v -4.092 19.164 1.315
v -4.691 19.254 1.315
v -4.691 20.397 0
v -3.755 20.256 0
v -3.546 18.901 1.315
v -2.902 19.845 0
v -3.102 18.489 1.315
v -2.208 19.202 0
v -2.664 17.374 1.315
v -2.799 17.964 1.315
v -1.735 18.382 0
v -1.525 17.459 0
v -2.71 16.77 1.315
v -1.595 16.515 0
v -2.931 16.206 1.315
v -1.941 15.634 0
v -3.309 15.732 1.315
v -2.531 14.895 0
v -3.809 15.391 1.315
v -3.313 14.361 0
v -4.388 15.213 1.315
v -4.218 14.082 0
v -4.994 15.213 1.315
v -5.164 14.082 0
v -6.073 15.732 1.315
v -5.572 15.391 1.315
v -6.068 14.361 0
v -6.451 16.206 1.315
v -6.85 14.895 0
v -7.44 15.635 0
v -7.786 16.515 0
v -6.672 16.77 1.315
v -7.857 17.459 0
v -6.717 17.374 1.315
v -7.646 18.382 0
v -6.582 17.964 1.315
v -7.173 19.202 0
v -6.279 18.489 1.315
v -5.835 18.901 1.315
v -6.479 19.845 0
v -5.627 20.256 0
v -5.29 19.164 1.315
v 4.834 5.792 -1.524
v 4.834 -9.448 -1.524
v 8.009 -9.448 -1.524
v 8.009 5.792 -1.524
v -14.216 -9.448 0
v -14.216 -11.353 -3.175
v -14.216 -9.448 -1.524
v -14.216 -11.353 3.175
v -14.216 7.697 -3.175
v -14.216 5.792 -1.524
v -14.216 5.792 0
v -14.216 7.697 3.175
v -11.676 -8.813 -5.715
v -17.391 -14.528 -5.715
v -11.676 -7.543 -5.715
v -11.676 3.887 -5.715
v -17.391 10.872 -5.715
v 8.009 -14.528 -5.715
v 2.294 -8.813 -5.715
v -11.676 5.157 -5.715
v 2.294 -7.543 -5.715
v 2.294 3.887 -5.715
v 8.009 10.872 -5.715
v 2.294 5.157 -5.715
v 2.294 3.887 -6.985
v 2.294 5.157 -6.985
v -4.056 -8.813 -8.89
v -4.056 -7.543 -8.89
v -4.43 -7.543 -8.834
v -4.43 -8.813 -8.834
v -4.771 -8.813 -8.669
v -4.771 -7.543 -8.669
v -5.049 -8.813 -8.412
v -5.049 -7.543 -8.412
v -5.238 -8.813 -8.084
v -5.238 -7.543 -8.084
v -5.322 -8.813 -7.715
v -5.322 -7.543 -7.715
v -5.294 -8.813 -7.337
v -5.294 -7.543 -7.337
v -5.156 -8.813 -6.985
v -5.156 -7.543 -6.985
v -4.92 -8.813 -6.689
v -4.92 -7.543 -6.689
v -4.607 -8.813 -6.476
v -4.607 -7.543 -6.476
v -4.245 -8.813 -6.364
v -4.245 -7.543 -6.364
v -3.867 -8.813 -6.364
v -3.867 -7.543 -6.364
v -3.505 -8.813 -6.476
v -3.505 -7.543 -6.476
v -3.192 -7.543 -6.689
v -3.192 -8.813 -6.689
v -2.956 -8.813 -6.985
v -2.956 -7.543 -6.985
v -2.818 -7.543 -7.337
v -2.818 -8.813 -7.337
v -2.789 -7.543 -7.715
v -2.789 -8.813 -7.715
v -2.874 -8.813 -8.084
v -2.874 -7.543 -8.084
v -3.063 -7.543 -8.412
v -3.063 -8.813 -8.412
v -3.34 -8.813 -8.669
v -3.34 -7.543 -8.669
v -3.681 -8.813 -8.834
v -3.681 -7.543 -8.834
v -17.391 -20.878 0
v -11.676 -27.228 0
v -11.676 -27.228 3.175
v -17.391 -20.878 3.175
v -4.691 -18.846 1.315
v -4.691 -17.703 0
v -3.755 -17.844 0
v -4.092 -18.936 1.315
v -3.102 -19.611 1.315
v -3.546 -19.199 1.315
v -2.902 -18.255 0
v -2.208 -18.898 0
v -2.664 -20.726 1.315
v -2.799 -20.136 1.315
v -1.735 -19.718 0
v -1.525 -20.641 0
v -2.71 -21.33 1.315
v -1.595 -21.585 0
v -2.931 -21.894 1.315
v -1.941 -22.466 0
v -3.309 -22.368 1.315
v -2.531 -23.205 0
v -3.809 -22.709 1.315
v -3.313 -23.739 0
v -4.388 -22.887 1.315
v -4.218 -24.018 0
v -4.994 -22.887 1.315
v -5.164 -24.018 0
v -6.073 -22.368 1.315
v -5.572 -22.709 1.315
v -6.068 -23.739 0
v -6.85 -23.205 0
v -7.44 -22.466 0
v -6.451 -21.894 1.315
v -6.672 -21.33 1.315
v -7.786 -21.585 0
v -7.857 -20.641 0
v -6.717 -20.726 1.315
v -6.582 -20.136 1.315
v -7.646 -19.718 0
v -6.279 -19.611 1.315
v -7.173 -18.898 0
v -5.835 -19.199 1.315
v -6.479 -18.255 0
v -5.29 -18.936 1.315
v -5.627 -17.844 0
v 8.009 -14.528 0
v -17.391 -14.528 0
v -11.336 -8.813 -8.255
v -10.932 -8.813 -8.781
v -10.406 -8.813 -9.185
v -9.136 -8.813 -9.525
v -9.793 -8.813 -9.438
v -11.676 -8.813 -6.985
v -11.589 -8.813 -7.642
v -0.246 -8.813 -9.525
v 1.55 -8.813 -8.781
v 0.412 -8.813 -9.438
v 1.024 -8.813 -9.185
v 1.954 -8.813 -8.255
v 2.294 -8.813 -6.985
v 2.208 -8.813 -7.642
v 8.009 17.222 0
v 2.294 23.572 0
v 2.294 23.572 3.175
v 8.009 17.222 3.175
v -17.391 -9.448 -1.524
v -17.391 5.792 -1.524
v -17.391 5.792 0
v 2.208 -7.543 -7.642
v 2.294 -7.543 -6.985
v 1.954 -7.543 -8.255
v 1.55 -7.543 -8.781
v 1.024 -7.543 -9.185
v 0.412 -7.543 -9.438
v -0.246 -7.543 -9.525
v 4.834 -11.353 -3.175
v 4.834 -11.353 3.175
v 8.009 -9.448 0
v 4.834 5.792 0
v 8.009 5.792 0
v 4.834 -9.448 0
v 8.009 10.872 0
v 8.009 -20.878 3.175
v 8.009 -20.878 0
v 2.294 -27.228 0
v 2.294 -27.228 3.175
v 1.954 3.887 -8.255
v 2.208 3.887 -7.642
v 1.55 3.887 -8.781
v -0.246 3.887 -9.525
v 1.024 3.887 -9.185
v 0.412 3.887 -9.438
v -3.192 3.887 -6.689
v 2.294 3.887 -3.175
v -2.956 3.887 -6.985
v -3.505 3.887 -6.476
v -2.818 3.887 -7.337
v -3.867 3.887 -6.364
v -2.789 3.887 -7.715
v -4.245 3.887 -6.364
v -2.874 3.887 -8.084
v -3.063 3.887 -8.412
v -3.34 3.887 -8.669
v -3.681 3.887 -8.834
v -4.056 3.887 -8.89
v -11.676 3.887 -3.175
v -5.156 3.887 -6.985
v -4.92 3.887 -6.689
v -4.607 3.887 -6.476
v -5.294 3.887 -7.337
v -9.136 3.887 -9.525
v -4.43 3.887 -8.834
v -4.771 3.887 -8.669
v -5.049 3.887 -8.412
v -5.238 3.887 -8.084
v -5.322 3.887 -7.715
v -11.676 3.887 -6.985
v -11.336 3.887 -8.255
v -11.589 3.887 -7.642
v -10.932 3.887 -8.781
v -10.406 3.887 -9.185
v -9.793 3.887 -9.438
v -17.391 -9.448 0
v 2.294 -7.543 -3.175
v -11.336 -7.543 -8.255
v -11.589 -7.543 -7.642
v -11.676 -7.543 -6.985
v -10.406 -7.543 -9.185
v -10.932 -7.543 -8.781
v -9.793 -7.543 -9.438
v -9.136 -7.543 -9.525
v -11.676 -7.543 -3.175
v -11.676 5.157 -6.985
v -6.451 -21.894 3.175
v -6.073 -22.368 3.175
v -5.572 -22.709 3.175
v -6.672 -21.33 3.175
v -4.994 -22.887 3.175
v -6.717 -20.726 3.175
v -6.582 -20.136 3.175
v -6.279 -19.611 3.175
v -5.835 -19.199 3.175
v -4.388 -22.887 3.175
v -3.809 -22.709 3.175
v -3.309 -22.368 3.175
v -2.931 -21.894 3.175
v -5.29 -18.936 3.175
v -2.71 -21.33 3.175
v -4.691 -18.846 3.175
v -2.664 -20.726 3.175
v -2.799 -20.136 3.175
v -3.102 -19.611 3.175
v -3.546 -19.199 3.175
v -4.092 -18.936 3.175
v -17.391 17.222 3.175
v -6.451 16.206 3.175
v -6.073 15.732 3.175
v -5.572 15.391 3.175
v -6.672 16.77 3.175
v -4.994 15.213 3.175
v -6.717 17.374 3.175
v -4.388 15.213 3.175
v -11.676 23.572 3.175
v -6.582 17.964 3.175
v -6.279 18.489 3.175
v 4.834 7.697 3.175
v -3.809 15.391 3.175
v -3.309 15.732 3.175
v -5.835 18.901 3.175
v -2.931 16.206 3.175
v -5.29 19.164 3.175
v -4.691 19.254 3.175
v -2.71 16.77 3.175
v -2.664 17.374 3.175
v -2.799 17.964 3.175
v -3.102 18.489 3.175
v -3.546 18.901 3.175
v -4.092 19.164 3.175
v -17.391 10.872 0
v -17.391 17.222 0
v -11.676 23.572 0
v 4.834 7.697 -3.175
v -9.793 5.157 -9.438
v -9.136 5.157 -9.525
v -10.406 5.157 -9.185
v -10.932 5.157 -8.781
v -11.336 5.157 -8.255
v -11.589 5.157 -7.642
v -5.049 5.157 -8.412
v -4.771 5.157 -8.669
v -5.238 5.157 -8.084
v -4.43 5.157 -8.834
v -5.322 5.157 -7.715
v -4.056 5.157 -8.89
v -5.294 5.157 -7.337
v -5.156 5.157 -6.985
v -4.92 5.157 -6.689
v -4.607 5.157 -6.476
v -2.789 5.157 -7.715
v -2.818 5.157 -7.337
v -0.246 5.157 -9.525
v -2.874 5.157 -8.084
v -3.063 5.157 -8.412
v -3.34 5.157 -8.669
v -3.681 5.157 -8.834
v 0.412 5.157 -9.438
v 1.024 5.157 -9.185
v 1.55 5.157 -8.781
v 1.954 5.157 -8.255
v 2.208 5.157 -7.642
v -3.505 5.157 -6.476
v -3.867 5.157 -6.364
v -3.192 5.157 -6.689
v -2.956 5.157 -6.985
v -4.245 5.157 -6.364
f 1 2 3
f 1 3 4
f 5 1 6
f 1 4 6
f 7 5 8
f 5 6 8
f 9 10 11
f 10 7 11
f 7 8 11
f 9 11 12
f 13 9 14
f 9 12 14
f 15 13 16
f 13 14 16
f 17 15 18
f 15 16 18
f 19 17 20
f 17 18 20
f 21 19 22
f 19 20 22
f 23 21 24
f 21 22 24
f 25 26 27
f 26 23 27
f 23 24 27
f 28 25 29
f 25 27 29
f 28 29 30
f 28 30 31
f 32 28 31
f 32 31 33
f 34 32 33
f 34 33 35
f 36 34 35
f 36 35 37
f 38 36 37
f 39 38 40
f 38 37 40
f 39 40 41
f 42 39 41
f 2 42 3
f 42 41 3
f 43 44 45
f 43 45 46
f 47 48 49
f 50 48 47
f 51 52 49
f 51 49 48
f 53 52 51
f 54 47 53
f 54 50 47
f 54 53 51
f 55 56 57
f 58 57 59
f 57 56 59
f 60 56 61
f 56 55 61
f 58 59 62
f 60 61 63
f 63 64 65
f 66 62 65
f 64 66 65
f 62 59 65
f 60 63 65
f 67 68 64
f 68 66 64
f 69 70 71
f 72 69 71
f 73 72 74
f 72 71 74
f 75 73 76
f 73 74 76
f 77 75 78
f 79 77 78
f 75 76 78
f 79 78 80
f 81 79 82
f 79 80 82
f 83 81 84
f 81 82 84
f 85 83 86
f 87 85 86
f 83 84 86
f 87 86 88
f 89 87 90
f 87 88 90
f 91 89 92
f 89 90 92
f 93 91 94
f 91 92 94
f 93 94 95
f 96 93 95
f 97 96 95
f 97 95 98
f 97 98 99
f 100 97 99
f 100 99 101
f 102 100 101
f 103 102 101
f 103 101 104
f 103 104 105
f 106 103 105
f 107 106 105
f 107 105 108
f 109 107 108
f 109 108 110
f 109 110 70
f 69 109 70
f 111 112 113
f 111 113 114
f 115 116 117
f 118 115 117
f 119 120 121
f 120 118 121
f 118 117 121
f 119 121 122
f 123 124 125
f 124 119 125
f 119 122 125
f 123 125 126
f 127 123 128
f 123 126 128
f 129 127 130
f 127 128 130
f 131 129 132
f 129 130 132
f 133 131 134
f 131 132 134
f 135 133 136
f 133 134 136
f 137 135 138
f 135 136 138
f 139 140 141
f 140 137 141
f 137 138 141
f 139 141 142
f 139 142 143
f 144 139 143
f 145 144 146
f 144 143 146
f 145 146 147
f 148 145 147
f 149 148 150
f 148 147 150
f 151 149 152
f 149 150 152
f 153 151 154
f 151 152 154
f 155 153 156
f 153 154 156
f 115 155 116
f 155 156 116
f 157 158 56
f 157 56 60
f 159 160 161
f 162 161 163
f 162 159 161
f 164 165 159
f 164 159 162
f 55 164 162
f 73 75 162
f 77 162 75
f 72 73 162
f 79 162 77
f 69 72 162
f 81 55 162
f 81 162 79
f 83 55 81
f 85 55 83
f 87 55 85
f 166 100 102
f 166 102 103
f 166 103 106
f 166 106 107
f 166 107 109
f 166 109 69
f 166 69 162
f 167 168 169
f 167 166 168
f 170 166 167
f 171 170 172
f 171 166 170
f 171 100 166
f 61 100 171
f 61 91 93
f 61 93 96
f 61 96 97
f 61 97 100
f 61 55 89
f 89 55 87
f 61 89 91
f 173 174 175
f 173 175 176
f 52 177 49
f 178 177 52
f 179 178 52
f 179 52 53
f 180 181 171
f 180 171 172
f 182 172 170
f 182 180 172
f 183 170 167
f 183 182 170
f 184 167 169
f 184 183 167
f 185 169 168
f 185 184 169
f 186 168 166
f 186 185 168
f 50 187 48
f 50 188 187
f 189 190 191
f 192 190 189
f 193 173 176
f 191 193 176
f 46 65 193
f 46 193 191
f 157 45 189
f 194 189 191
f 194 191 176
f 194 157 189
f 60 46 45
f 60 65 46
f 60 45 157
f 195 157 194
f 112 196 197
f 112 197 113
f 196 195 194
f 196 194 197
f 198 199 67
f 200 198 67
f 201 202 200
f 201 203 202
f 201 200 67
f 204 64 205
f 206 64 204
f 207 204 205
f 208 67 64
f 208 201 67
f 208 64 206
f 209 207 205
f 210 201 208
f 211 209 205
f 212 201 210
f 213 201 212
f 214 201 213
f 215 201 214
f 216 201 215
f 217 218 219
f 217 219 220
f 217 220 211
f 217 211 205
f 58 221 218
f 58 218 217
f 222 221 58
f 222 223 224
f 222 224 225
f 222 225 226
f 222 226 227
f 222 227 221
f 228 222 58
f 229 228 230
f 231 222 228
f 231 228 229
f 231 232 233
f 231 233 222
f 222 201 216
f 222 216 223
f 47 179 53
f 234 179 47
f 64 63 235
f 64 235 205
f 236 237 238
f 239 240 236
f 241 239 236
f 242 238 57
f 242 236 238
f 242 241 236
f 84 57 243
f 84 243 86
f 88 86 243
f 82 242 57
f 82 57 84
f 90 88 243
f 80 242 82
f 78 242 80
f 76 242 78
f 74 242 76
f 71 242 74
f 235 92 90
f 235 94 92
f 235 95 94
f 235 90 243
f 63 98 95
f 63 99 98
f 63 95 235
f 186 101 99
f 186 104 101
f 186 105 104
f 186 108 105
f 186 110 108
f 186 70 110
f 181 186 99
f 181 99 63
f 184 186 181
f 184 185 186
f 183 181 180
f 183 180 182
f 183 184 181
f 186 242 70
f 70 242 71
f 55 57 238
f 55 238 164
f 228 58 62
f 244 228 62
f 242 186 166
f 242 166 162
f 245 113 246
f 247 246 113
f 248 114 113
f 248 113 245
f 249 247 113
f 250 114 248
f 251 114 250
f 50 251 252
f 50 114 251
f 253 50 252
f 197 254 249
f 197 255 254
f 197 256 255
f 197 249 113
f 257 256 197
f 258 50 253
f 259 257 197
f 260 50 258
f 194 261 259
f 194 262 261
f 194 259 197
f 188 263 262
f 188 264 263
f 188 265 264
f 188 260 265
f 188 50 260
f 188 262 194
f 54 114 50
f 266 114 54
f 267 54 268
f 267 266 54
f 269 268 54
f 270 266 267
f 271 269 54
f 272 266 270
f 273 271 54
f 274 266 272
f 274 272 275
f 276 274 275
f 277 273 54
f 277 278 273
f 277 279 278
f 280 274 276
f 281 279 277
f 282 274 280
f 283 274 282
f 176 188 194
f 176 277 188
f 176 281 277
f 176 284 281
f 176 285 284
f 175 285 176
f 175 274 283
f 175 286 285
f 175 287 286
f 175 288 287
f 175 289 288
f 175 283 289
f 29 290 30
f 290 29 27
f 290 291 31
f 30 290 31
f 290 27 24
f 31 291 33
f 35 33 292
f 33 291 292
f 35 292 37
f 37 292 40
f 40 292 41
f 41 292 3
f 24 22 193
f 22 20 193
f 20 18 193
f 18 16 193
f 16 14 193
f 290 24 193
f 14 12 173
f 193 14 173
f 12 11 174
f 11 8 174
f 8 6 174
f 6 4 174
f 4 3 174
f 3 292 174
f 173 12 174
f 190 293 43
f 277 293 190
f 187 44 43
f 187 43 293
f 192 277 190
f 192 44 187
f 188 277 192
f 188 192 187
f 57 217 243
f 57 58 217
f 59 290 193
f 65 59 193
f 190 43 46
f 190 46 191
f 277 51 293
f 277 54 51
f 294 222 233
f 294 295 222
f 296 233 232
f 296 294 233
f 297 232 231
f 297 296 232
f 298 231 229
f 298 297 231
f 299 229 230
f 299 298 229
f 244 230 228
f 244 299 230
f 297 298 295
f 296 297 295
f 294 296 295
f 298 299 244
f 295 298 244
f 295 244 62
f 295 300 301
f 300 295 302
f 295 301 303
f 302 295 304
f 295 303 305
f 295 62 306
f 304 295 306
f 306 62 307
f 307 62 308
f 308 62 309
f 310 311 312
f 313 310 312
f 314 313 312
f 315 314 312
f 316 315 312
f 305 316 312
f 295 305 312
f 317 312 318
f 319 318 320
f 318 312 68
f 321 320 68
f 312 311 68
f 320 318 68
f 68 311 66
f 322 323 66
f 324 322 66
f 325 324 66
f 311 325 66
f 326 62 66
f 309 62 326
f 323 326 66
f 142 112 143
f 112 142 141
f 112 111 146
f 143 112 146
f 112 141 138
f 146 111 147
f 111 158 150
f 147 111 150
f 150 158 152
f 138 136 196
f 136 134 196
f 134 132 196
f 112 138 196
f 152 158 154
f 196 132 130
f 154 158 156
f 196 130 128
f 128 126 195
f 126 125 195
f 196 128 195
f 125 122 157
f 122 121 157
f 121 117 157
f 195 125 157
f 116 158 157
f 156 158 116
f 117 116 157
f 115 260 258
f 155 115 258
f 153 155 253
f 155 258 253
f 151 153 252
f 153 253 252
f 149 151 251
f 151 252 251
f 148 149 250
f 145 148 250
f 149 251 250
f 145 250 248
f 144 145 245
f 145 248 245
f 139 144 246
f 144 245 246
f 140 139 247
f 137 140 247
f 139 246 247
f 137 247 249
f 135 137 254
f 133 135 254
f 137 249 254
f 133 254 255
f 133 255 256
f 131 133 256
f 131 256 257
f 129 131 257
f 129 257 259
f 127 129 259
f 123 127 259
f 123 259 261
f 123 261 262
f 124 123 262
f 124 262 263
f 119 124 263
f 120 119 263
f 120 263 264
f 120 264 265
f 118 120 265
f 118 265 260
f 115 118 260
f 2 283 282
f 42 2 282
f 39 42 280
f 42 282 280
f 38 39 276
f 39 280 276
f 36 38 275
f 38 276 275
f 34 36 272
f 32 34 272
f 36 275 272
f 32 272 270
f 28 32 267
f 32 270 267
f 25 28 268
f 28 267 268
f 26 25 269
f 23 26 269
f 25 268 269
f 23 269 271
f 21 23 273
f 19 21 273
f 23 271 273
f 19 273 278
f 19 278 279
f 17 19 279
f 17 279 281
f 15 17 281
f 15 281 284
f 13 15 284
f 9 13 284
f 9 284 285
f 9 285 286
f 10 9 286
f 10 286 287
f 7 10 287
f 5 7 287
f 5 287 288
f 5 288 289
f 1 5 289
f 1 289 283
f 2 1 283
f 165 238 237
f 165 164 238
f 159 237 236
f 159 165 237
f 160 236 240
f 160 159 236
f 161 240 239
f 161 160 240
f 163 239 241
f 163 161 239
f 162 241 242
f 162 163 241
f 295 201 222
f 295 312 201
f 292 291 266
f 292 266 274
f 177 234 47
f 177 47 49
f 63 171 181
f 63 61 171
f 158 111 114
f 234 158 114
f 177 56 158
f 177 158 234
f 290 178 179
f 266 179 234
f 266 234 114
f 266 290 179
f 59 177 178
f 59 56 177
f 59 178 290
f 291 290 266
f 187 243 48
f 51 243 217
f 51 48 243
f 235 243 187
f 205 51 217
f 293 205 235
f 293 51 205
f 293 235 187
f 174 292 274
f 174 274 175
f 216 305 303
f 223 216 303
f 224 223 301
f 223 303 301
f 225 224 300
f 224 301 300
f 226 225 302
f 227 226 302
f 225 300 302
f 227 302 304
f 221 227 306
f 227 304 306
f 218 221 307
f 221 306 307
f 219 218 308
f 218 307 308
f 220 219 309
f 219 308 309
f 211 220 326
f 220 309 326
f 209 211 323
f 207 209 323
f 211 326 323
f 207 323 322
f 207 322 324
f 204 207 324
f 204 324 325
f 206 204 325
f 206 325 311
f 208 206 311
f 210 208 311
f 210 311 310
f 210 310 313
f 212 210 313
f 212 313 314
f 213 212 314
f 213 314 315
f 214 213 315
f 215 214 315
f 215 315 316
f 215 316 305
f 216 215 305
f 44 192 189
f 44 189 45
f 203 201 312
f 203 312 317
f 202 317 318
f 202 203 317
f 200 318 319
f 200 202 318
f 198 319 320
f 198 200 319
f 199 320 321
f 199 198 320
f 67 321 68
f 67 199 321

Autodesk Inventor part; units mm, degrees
ref_plane "YZ Plane" through (0, 0, 0) normal (1, 0, 0) x (0, 1, 0)
ref_plane "XZ Plane" through (0, 0, 0) normal (0, 1, 0) x (-1, 0, 0)
ref_plane "XY Plane" through (0, 0, 0) normal (0, 0, 1) x (1, 0, 0)
sketch "Sketch1" plane through (0, 0, 0) normal (0, 0, 1) x (1, 0, 0)
  line L0 (-11.6758, 23.572) -> (2.2942, 23.572)
  line L1 (2.2942, 23.572) -> (8.0092, 17.222)
  line L2 (8.0092, 17.222) -> (8.0092, -20.878)
  line L3 (8.0092, -20.878) -> (2.2942, -27.228)
  line L4 (2.2942, -27.228) -> (-11.6758, -27.228)
  line L5 (-11.6758, -27.228) -> (-17.3908, -20.878)
  line L6 (-17.3908, -20.878) -> (-17.3908, 17.222)
  line L7 (-17.3908, 17.222) -> (-11.6758, 23.572)
  line L8 (-4.6908, 23.572) -> (-4.6908, -27.228) construction
  line L9 (-17.3908, -1.828) -> (8.0092, -1.828) construction
  dimension "d0" = 25.4
  dimension "d1" = 50.8
  dimension "d2" = 5.715
  dimension "d4" = 6.35
extrude "Extrusion1" add sketch "Sketch1" along normal blind 3.175
sketch "Sketch2" plane through (0, 0, 3.175) normal (0, 0, 1) x (1, 0, 0)
  line L0 (-17.3908, -20.878) -> (-17.3908, 17.222) projected
  line L1 (8.0092, 17.222) -> (8.0092, -20.878) projected
  line L2 (-17.3908, 10.872) -> (8.0092, 10.872)
  line L3 (-17.3908, -14.528) -> (8.0092, -14.528)
  point P0 (2.2942, -27.228)
  dimension "d11" = 25.4
  dimension "d12" = 12.7
extrude "Extrusion2" add sketch "Sketch2" against normal blind 8.89
sketch "Sketch3" plane through (0, 0, -5.715) normal (0, 0, -1) x (-1, 0, 0)
  line L0 (17.3908, -14.528) -> (-8.0092, -14.528) projected
  line L1 (-8.0092, 10.872) -> (17.3908, 10.872) projected
  line L2 (-8.0092, -14.528) -> (-8.0092, 10.872) projected
  line L3 (-2.2942, 3.887) -> (11.6758, 3.887)
  line L4 (11.6758, 3.887) -> (11.6758, -7.543)
  line L5 (11.6758, -7.543) -> (-2.2942, -7.543)
  line L6 (-2.2942, -7.543) -> (-2.2942, 3.887)
  circle A0 centre (4.6908, -1.828) radius 5.715 construction
  circle A1 centre (4.6908, -1.828) radius 12.7 construction
  dimension "d15" = 11.43
  dimension "d16" = 5.715
  dimension "d17" = 5.715
extrude "Extrusion3" cut sketch "Sketch3" against normal through all
sketch "Sketch4" plane through (0, 0, -5.715) normal (0, 0, -1) x (-1, 0, 0)
  line L0 (11.6758, 3.887) -> (11.6758, -7.543) projected
  line L1 (-2.2942, 3.887) -> (11.6758, 3.887)
  line L2 (11.6758, 3.887) -> (11.6758, 5.157)
  line L3 (11.6758, 5.157) -> (-2.2942, 5.157)
  line L4 (-2.2942, 5.157) -> (-2.2942, 3.887)
  line L5 (-2.2942, -7.543) -> (11.6758, -7.543)
  line L6 (11.6758, -7.543) -> (11.6758, -8.813)
  line L7 (11.6758, -8.813) -> (-2.2942, -8.813)
  line L8 (-2.2942, -8.813) -> (-2.2942, -7.543)
  dimension "d20" = 1.27
  dimension "d21" = 1.27
extrude "Extrusion4" add sketch "Sketch4" along normal blind 3.81
sketch "Sketch5" plane through (0, 0, 3.175) normal (0, 0, 1) x (1, 0, 0)
  line L0 (2.2942, 3.887) -> (2.2942, -7.543) projected
  line L1 (2.2942, -7.543) -> (-11.6758, -7.543) projected
  line L2 (-11.6758, -7.543) -> (-11.6758, 3.887) projected
  line L3 (-11.6758, 3.887) -> (2.2942, 3.887) projected
  line L4 (-14.2158, 7.697) -> (4.8342, 7.697)
  line L5 (4.8342, 7.697) -> (4.8342, -11.353)
  line L6 (4.8342, -11.353) -> (-14.2158, -11.353)
  line L7 (-14.2158, -11.353) -> (-14.2158, 7.697)
  point P0 (-17.3908, -20.878)
  point P1 (-11.6758, 23.572)
  dimension "d24" = 19.05
  dimension "d25" = 19.05
  dimension "d26" = 3.175
  dimension "d27" = 15.875
extrude "Extrusion5" cut sketch "Sketch5" against normal blind 6.35
sketch "Sketch6" plane through (-17.3908, -20.878, 3.175) normal (-1, 0, 0) x (0, 0, 1)
  line L0 (-4.699, 26.67) -> (-3.175, 26.67)
  line L1 (-3.175, 26.67) -> (-3.175, 11.43)
  line L2 (-3.175, 11.43) -> (-4.699, 11.43)
  line L3 (-4.699, 11.43) -> (-4.699, 26.67)
  line L4 (-3.175, 44.45) -> (0, 44.45) projected
  point P0 (0, 0)
  dimension "d30" = 15.24
  dimension "d31" = 1.524
  dimension "d32" = 3.175
  dimension "d33" = 17.78
extrude "Extrusion6" cut sketch "Sketch6" against normal through all
fillet "Fillet1" radius 2.54 4 edges at (2.2942, -8.178, -9.525) (2.2942, 4.522, -9.525) (-11.6758, 4.522, -9.525) (-11.6758, -8.178, -9.525)
sketch "Sketch7" plane through (-11.6758, -8.813, -5.715) normal (0, -1, 0) x (1, 0, 0)
  line L0 (-5.715, 5.715) -> (-5.715, 0) projected
  line L1 (0, 8.89) -> (-5.715, 8.89) projected
  point P0 (7.62, -1.905)
  dimension "d37" = 13.335
  dimension "d38" = 10.795
hole "Hole1" at (-4.0558, -8.813, -7.62) direction (0, 1, 0) diameter 2.54 end through all
sketch "Sketch8" plane through (0, 0, 0) normal (0, 0, -1) x (-1, 0, 0)
  line L0 (-8.0092, 17.222) -> (-8.0092, 10.872) projected
  line L1 (11.6758, 23.572) -> (-2.2942, 23.572) projected
  point P0 (4.6908, 17.222)
  point P1 (4.6908, -20.878)
  dimension "d46" = 12.7
  dimension "d47" = 6.35
  dimension "d48" = 38.1
hole "Hole2" at (-4.6908, 17.222, 0) at (-4.6908, -20.878, 0) direction (0, 0, 1) diameter 4.064 end through all countersink diameter 6.35 countersink angle 82
properties part number "latchbase"
